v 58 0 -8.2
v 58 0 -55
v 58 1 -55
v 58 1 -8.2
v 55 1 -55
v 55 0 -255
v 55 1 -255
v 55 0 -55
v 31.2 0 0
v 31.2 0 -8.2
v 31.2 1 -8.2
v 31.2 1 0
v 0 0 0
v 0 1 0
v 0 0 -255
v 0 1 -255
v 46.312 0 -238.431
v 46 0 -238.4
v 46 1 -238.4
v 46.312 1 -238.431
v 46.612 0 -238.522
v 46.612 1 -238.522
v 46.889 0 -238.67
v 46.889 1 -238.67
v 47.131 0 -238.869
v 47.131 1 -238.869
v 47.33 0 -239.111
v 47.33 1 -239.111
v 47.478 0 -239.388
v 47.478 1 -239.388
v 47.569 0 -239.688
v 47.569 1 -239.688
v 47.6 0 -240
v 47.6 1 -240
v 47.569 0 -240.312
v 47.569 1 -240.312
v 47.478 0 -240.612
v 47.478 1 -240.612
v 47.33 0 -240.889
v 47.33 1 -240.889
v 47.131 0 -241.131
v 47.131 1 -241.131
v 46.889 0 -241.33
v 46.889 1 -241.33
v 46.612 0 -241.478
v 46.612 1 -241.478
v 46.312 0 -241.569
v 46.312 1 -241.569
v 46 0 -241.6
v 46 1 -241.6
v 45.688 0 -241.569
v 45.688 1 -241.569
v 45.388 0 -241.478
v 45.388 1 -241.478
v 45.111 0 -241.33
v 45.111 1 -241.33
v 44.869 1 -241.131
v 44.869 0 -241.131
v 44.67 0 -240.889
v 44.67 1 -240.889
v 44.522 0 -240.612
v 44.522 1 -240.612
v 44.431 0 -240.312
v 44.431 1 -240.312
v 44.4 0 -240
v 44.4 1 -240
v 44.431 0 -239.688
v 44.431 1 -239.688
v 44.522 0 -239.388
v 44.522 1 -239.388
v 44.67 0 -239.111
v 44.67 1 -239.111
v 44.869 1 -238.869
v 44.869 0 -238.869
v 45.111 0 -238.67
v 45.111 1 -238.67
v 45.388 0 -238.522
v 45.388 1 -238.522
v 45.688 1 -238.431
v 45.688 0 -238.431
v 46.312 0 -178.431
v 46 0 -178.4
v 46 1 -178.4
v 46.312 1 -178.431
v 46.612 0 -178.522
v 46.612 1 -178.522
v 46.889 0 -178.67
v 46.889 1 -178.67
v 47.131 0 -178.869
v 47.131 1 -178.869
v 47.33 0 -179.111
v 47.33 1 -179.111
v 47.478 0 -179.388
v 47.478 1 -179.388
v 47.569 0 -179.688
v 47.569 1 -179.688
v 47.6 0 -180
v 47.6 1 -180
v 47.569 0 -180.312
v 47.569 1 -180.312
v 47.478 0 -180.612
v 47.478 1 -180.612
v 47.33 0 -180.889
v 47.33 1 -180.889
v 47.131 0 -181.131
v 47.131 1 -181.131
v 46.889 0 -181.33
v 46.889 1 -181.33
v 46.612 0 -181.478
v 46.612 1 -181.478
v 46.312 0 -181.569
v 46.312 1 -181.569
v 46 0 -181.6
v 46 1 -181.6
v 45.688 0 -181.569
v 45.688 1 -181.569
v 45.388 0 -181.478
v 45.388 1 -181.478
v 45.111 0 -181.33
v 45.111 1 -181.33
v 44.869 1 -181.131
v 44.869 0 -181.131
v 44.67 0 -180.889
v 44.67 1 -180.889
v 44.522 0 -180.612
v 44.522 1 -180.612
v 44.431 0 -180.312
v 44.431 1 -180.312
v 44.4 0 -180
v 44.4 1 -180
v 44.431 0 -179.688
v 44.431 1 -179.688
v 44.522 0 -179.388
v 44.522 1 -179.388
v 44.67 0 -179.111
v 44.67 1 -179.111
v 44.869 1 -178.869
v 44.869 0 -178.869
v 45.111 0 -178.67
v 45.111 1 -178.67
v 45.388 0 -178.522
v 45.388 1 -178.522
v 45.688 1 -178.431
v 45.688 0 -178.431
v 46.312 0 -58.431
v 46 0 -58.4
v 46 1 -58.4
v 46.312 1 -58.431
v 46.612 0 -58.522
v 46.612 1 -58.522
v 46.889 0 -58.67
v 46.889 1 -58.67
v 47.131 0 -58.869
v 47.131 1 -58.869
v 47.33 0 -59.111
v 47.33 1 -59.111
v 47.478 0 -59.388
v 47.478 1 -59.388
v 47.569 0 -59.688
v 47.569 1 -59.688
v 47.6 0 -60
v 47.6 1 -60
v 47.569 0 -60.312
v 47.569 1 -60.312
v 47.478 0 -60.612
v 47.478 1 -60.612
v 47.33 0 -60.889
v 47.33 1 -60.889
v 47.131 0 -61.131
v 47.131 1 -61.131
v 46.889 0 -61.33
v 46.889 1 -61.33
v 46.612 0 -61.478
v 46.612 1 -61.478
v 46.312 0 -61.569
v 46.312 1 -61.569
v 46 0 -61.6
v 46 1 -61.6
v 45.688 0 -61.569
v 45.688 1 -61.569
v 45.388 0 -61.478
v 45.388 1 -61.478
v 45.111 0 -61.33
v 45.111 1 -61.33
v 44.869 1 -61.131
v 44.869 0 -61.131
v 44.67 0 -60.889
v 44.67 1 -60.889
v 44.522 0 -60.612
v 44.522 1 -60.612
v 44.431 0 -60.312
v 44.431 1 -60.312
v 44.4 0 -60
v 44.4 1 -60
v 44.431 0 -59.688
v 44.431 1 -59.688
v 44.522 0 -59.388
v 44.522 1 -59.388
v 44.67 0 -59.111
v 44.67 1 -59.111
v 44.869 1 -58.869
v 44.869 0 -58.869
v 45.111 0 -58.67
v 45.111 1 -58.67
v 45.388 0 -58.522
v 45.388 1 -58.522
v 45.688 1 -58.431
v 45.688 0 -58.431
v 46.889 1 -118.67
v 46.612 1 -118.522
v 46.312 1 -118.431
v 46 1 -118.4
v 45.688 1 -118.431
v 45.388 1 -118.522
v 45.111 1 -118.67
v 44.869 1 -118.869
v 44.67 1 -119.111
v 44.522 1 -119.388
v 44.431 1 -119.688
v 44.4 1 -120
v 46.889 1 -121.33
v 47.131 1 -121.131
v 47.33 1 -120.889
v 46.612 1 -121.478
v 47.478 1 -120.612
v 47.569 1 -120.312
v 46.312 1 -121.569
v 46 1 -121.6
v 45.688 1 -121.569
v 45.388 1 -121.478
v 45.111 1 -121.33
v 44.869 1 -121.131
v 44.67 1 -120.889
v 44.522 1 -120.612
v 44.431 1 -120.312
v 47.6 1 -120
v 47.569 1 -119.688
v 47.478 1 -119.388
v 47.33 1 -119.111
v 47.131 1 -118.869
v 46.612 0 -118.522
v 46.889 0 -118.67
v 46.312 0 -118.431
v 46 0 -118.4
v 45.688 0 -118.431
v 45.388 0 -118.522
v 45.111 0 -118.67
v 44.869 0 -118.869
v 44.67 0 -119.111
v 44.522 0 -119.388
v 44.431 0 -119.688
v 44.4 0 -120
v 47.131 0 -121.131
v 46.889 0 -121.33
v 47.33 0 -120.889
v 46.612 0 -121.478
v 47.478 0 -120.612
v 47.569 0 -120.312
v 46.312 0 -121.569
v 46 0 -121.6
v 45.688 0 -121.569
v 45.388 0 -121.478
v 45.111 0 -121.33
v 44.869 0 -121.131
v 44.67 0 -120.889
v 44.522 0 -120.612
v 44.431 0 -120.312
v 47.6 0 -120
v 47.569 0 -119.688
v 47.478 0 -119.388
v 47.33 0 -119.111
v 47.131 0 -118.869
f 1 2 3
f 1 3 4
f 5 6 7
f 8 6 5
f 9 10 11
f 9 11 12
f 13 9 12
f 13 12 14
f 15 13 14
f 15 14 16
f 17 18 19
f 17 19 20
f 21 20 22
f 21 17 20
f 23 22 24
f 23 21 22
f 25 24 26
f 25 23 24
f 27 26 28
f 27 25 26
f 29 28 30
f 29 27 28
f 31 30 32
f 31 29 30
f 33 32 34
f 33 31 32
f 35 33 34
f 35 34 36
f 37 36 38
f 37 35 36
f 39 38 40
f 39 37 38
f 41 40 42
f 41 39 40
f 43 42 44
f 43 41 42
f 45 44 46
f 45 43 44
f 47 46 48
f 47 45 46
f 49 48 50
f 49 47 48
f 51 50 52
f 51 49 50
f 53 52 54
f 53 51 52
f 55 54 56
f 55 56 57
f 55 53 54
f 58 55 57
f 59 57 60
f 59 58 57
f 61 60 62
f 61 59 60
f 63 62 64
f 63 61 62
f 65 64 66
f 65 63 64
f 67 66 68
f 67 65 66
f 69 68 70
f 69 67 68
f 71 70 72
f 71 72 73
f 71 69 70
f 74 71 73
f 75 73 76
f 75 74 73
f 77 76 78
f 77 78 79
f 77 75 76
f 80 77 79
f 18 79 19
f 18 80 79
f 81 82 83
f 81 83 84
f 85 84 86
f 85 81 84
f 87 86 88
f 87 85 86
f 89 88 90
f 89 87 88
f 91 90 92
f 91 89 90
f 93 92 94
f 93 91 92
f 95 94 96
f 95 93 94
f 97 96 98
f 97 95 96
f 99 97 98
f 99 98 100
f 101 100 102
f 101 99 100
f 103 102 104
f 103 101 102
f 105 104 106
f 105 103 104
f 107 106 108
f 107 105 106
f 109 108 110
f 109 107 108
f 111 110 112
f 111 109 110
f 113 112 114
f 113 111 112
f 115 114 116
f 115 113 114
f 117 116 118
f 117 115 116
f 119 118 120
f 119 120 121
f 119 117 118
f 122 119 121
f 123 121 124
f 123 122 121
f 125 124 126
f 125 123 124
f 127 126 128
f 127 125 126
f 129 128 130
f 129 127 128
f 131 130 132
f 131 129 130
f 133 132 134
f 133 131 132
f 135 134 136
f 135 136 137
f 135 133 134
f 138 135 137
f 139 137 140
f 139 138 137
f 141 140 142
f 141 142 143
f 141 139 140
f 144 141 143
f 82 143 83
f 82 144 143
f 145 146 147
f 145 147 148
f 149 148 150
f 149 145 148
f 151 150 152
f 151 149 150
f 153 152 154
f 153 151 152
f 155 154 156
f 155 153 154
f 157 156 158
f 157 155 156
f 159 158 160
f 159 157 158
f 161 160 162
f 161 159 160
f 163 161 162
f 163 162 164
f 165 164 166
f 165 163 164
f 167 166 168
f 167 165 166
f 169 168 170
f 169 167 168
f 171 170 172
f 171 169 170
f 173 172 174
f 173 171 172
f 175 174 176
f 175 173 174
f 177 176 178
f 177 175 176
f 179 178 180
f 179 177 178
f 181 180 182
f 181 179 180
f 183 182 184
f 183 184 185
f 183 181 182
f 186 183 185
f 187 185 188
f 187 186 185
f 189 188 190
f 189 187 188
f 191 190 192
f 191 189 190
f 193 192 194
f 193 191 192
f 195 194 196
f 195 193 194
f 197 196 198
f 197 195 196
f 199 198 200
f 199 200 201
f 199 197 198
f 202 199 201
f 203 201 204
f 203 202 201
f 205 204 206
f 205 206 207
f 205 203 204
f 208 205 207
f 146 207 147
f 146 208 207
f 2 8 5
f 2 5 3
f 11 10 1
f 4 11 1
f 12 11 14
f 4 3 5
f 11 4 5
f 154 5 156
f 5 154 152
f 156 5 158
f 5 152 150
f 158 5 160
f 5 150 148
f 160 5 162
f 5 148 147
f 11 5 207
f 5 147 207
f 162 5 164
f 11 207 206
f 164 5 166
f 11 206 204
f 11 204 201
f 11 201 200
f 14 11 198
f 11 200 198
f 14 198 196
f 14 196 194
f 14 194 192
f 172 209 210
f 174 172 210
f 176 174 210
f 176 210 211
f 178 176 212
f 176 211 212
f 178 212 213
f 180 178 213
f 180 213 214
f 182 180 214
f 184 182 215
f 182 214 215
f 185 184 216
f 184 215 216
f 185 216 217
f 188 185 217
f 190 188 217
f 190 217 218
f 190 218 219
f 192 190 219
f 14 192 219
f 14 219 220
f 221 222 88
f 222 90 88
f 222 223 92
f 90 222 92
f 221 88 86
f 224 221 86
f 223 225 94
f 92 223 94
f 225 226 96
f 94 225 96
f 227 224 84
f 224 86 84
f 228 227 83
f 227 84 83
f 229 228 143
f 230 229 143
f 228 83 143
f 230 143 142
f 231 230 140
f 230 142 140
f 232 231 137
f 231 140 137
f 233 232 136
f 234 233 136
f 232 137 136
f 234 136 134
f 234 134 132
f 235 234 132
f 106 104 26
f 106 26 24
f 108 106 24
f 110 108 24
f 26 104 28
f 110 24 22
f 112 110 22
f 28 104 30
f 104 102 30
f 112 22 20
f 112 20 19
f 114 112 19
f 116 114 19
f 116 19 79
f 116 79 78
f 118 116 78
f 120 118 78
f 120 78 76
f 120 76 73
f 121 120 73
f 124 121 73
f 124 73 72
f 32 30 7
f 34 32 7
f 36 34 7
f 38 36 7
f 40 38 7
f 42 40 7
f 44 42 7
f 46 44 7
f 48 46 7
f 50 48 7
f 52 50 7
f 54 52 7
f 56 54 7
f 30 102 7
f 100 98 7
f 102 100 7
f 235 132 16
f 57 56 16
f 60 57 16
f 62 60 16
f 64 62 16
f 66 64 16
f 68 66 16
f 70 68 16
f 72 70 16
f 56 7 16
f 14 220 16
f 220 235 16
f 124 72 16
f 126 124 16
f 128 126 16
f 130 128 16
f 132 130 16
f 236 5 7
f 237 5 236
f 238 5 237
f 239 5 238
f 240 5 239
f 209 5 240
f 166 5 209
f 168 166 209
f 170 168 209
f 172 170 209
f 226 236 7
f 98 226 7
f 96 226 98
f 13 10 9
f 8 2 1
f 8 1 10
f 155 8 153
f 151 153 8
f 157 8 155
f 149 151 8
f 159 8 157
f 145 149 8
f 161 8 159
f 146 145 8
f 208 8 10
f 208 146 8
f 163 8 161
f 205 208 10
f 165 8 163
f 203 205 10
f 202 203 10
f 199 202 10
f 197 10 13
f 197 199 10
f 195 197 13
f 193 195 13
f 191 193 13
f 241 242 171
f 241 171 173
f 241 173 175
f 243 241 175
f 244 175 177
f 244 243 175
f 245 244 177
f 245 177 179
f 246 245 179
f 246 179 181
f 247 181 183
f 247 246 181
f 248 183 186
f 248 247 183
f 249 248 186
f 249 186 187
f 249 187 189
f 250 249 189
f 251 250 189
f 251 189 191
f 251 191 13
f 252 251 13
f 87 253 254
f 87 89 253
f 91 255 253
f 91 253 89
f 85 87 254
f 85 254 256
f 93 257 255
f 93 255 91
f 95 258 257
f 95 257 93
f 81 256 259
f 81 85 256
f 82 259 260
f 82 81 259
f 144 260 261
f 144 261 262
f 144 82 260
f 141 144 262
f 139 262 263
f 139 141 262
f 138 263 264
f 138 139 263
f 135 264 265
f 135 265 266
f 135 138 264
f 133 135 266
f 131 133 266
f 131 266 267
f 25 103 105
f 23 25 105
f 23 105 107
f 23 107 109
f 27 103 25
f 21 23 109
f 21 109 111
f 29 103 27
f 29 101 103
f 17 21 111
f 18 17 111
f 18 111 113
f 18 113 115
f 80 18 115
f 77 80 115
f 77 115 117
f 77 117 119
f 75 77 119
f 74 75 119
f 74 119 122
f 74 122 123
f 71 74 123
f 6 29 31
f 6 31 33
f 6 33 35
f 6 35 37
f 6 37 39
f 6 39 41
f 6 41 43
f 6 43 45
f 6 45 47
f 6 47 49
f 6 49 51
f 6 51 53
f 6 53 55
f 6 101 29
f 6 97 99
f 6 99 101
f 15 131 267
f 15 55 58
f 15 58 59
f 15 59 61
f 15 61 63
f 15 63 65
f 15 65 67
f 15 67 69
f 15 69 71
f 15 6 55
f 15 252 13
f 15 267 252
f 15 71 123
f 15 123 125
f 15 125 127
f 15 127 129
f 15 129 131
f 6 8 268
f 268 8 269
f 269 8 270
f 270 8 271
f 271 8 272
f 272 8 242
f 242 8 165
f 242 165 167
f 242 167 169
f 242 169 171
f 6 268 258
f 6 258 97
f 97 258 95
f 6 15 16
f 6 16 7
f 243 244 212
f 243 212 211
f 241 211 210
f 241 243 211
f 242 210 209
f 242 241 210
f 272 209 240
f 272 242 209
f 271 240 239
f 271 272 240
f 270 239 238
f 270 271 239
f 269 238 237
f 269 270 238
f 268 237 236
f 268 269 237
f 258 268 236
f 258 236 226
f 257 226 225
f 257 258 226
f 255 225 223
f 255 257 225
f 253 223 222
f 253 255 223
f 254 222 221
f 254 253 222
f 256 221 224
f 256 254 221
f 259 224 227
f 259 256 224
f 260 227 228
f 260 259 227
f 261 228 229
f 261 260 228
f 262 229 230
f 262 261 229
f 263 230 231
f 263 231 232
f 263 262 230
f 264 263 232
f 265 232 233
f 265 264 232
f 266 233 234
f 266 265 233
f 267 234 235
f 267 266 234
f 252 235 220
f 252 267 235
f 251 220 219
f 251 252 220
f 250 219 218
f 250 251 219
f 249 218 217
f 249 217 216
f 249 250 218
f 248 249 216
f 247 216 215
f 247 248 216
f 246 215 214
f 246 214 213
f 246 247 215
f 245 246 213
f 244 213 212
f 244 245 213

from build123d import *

# Parameters (mm, degrees)
ESQUISSE1_R        = 1.6
BOSS_EXTRU_1_DEPTH = 1


with BuildPart() as part:
    # Esquisse1 → Boss.-Extru.1 (new body)
    with BuildSketch(Plane(origin=(0, 0, 0), x_dir=(1, 0, 0), z_dir=(0, 1, 0))):
        Polygon((0, 0), (0, 255), (55, 255), (55, 55), (58, 55), (58, 8.2), (55, 8.2), (31.2, 8.2), (31.2, 0), align=None)
        with Locations(Location((46, 60, 0), (0, 0, 270))):
            Circle(ESQUISSE1_R, mode=Mode.SUBTRACT)
        with Locations(Location((46, 120, 0), (0, 0, 270))):
            Circle(ESQUISSE1_R, mode=Mode.SUBTRACT)
        with Locations(Location((46, 180, 0), (0, 0, 270))):
            Circle(ESQUISSE1_R, mode=Mode.SUBTRACT)
        with Locations(Location((46, 240, 0), (0, 0, 270))):
            Circle(ESQUISSE1_R, mode=Mode.SUBTRACT)
    extrude(amount=BOSS_EXTRU_1_DEPTH)


solid = part.part
